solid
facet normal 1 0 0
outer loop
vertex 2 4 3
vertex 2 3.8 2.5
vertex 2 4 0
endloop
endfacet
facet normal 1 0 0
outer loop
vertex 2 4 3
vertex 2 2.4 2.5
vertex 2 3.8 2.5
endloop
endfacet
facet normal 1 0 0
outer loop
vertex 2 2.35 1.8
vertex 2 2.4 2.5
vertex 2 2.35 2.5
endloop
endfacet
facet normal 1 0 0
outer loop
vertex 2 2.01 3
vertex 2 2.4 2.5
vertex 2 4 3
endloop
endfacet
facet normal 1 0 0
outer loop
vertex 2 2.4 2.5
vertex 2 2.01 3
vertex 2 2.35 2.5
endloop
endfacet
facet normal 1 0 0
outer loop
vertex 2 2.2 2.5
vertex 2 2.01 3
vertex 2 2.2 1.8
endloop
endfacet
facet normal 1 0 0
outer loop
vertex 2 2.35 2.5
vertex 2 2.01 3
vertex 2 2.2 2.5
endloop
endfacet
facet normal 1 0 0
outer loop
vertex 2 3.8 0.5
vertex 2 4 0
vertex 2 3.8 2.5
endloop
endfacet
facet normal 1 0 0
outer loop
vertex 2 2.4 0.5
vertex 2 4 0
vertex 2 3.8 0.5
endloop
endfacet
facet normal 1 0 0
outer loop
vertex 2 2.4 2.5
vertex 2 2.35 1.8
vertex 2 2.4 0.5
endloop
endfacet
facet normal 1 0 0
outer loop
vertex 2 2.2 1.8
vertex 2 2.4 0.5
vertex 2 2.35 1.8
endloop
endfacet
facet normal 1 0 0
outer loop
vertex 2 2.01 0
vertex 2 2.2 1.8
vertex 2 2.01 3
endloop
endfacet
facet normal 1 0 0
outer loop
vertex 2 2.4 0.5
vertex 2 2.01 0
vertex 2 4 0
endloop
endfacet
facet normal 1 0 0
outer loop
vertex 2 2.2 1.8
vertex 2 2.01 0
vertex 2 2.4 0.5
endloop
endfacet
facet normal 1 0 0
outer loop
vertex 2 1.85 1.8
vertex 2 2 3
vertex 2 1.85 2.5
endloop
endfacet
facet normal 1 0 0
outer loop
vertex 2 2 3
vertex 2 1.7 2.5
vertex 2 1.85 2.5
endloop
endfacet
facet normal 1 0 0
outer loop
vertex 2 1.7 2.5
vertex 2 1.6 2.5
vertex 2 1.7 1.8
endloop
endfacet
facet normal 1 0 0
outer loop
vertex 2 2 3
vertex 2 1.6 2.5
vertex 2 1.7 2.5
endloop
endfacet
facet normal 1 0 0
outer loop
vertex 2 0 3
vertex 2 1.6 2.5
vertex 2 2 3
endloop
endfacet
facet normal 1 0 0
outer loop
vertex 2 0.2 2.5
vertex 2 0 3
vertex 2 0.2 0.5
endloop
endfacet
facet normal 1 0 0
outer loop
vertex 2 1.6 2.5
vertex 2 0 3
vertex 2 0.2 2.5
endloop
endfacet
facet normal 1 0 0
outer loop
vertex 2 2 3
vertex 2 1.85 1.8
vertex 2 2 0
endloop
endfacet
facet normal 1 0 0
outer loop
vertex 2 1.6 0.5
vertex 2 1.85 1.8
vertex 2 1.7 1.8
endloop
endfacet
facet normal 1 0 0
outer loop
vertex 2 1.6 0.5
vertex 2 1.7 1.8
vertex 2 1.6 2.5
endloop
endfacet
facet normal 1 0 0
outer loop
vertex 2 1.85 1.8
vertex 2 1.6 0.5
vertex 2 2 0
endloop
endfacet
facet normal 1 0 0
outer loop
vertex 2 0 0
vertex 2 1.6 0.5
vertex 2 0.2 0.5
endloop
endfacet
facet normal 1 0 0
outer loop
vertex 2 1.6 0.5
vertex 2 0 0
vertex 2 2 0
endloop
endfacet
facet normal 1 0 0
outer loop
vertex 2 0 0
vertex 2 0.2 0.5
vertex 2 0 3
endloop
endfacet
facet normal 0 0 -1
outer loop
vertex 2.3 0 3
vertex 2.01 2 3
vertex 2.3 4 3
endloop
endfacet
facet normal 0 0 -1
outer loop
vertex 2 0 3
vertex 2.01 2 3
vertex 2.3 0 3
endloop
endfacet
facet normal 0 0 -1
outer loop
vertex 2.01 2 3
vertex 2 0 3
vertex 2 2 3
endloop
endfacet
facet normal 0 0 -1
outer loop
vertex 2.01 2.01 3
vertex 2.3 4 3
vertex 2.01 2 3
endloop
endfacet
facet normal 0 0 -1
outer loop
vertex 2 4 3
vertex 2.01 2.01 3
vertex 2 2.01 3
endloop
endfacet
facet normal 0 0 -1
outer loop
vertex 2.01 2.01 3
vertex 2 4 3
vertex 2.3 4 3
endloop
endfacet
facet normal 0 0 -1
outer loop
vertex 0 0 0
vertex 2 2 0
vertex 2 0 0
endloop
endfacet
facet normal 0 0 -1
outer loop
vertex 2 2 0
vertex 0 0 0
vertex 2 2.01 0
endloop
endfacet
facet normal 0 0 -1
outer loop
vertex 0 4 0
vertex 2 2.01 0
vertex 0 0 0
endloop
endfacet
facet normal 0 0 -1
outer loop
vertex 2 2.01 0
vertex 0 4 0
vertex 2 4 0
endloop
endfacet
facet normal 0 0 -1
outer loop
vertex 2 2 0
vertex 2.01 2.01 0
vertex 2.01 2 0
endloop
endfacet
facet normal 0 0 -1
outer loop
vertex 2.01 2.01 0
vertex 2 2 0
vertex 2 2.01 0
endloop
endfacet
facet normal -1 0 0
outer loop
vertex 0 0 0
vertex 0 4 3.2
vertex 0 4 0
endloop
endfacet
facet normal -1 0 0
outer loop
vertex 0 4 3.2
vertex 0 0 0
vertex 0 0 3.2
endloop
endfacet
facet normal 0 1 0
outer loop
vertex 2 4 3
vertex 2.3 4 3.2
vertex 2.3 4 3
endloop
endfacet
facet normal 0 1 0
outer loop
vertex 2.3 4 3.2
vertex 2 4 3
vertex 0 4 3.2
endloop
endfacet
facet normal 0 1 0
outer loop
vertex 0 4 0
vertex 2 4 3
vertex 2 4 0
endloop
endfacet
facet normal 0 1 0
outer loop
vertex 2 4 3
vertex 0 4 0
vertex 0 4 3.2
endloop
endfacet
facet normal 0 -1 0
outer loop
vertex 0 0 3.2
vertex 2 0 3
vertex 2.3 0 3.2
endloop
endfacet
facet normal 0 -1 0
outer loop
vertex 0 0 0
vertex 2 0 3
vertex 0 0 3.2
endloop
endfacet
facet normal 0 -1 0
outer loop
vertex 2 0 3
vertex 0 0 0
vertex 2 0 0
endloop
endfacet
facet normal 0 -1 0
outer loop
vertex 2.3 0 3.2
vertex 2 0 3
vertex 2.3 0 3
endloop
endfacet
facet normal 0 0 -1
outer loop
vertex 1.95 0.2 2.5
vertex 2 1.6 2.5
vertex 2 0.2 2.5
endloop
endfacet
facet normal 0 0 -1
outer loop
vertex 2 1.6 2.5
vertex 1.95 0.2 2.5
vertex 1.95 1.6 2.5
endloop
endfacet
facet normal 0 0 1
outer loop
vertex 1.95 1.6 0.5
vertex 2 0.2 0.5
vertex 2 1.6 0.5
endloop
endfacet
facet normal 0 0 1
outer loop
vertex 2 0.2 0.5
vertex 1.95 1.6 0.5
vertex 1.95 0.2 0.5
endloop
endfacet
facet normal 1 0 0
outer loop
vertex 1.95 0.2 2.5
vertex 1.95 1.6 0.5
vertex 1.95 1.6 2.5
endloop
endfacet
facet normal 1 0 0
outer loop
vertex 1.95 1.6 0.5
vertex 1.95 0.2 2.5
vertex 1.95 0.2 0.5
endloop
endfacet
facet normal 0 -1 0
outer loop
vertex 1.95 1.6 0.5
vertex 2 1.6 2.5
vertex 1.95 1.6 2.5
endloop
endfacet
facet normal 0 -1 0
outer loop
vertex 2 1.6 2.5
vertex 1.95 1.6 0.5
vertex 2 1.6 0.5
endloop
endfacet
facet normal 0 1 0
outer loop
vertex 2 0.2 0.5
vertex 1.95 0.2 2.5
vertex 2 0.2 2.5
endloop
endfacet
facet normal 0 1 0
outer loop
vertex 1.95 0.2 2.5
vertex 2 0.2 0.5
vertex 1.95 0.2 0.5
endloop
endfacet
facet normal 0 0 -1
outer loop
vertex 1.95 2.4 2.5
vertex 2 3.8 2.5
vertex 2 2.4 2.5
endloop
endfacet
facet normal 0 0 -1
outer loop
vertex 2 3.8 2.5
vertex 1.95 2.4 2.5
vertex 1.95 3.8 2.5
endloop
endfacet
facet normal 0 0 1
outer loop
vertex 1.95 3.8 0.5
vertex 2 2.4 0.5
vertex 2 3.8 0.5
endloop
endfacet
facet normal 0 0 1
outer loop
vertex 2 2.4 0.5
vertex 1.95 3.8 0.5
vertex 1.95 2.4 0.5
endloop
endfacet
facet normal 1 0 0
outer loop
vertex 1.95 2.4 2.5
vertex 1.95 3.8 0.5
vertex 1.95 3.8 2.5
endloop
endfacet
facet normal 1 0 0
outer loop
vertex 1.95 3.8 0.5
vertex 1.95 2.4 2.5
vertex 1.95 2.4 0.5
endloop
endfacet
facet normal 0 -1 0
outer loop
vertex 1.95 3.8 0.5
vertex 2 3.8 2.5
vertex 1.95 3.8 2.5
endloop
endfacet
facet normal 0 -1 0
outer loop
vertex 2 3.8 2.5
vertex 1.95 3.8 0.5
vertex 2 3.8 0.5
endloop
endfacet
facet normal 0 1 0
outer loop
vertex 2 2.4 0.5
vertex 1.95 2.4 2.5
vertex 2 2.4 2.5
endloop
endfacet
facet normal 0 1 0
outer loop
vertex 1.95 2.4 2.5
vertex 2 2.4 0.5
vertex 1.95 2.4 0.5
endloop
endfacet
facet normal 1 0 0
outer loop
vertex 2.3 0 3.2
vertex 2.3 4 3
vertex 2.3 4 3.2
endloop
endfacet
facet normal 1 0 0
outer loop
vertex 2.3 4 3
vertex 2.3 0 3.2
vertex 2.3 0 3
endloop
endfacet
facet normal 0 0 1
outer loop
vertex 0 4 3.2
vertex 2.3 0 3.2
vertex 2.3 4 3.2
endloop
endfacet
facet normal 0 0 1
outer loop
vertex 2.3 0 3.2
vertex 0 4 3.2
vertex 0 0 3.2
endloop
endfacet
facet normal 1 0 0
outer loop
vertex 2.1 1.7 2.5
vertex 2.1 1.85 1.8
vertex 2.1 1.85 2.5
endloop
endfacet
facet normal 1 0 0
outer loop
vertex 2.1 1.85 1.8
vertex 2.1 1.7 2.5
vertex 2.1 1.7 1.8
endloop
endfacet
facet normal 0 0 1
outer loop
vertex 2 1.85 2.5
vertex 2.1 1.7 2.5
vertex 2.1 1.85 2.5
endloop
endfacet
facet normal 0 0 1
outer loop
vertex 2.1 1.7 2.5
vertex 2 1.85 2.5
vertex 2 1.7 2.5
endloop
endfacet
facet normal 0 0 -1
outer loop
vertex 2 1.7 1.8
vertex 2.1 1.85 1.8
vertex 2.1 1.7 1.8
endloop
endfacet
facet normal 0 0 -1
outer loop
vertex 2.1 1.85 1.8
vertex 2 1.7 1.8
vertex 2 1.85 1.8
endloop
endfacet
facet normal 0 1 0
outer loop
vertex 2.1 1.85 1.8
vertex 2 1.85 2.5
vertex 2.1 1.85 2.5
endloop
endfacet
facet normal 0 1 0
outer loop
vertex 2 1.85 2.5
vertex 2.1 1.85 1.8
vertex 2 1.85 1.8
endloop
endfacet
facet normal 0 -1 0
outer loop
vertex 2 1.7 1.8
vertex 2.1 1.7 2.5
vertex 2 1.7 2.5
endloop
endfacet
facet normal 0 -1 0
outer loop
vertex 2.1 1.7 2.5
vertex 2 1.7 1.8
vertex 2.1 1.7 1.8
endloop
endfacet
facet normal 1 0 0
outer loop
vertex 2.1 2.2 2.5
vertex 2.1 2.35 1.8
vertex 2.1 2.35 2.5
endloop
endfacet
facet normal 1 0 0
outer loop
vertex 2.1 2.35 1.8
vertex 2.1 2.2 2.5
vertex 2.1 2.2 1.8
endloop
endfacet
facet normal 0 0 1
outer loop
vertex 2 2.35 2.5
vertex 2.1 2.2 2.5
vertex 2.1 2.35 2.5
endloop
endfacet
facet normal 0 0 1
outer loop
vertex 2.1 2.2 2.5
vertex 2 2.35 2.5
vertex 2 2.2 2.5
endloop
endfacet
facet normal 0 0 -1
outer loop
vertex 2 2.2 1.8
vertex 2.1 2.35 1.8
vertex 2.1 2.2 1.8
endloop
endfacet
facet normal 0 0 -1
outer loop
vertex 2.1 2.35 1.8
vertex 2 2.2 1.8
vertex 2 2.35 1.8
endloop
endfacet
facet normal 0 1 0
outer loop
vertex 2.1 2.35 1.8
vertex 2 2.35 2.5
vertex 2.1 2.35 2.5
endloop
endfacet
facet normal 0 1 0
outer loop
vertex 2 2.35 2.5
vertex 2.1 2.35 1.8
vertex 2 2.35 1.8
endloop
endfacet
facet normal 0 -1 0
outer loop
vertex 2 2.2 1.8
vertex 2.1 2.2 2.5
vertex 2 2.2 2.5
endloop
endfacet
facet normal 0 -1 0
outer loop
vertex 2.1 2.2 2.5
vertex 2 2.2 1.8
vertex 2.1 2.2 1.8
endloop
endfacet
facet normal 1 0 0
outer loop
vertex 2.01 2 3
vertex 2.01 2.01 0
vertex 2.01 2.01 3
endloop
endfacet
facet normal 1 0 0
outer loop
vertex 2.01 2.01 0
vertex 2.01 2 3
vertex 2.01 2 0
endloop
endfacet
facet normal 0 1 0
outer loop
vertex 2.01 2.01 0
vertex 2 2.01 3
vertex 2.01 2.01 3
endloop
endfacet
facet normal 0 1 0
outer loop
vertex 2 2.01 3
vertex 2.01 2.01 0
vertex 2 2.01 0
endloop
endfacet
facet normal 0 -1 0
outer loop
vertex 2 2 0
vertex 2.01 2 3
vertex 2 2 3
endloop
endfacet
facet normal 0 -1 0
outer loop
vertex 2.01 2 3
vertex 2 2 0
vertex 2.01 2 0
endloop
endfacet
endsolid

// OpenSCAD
translate([0,0,3])
color("#8b6914")
cube([2.3,4,0.2]);



difference(){
color("#cdaa7d")
cube([2,4,3]);

translate([1.95,0.2,0.5])
color("#cdaa6f")
cube([0.1,1.4,2]);

translate([1.95 ,2.4,0.5])
color("#cdaa6f")
cube([0.1,1.4,2]);

}


translate([2,1.7,1.8])
color("#8b6914")
cube([0.1,0.15,0.7]);


translate([2,2.2,1.8])
color("#8b6914")
cube([0.1,0.15,0.7]);


translate([2,2,0])
color("#000000")
cube([0.01,0.01,3]);
